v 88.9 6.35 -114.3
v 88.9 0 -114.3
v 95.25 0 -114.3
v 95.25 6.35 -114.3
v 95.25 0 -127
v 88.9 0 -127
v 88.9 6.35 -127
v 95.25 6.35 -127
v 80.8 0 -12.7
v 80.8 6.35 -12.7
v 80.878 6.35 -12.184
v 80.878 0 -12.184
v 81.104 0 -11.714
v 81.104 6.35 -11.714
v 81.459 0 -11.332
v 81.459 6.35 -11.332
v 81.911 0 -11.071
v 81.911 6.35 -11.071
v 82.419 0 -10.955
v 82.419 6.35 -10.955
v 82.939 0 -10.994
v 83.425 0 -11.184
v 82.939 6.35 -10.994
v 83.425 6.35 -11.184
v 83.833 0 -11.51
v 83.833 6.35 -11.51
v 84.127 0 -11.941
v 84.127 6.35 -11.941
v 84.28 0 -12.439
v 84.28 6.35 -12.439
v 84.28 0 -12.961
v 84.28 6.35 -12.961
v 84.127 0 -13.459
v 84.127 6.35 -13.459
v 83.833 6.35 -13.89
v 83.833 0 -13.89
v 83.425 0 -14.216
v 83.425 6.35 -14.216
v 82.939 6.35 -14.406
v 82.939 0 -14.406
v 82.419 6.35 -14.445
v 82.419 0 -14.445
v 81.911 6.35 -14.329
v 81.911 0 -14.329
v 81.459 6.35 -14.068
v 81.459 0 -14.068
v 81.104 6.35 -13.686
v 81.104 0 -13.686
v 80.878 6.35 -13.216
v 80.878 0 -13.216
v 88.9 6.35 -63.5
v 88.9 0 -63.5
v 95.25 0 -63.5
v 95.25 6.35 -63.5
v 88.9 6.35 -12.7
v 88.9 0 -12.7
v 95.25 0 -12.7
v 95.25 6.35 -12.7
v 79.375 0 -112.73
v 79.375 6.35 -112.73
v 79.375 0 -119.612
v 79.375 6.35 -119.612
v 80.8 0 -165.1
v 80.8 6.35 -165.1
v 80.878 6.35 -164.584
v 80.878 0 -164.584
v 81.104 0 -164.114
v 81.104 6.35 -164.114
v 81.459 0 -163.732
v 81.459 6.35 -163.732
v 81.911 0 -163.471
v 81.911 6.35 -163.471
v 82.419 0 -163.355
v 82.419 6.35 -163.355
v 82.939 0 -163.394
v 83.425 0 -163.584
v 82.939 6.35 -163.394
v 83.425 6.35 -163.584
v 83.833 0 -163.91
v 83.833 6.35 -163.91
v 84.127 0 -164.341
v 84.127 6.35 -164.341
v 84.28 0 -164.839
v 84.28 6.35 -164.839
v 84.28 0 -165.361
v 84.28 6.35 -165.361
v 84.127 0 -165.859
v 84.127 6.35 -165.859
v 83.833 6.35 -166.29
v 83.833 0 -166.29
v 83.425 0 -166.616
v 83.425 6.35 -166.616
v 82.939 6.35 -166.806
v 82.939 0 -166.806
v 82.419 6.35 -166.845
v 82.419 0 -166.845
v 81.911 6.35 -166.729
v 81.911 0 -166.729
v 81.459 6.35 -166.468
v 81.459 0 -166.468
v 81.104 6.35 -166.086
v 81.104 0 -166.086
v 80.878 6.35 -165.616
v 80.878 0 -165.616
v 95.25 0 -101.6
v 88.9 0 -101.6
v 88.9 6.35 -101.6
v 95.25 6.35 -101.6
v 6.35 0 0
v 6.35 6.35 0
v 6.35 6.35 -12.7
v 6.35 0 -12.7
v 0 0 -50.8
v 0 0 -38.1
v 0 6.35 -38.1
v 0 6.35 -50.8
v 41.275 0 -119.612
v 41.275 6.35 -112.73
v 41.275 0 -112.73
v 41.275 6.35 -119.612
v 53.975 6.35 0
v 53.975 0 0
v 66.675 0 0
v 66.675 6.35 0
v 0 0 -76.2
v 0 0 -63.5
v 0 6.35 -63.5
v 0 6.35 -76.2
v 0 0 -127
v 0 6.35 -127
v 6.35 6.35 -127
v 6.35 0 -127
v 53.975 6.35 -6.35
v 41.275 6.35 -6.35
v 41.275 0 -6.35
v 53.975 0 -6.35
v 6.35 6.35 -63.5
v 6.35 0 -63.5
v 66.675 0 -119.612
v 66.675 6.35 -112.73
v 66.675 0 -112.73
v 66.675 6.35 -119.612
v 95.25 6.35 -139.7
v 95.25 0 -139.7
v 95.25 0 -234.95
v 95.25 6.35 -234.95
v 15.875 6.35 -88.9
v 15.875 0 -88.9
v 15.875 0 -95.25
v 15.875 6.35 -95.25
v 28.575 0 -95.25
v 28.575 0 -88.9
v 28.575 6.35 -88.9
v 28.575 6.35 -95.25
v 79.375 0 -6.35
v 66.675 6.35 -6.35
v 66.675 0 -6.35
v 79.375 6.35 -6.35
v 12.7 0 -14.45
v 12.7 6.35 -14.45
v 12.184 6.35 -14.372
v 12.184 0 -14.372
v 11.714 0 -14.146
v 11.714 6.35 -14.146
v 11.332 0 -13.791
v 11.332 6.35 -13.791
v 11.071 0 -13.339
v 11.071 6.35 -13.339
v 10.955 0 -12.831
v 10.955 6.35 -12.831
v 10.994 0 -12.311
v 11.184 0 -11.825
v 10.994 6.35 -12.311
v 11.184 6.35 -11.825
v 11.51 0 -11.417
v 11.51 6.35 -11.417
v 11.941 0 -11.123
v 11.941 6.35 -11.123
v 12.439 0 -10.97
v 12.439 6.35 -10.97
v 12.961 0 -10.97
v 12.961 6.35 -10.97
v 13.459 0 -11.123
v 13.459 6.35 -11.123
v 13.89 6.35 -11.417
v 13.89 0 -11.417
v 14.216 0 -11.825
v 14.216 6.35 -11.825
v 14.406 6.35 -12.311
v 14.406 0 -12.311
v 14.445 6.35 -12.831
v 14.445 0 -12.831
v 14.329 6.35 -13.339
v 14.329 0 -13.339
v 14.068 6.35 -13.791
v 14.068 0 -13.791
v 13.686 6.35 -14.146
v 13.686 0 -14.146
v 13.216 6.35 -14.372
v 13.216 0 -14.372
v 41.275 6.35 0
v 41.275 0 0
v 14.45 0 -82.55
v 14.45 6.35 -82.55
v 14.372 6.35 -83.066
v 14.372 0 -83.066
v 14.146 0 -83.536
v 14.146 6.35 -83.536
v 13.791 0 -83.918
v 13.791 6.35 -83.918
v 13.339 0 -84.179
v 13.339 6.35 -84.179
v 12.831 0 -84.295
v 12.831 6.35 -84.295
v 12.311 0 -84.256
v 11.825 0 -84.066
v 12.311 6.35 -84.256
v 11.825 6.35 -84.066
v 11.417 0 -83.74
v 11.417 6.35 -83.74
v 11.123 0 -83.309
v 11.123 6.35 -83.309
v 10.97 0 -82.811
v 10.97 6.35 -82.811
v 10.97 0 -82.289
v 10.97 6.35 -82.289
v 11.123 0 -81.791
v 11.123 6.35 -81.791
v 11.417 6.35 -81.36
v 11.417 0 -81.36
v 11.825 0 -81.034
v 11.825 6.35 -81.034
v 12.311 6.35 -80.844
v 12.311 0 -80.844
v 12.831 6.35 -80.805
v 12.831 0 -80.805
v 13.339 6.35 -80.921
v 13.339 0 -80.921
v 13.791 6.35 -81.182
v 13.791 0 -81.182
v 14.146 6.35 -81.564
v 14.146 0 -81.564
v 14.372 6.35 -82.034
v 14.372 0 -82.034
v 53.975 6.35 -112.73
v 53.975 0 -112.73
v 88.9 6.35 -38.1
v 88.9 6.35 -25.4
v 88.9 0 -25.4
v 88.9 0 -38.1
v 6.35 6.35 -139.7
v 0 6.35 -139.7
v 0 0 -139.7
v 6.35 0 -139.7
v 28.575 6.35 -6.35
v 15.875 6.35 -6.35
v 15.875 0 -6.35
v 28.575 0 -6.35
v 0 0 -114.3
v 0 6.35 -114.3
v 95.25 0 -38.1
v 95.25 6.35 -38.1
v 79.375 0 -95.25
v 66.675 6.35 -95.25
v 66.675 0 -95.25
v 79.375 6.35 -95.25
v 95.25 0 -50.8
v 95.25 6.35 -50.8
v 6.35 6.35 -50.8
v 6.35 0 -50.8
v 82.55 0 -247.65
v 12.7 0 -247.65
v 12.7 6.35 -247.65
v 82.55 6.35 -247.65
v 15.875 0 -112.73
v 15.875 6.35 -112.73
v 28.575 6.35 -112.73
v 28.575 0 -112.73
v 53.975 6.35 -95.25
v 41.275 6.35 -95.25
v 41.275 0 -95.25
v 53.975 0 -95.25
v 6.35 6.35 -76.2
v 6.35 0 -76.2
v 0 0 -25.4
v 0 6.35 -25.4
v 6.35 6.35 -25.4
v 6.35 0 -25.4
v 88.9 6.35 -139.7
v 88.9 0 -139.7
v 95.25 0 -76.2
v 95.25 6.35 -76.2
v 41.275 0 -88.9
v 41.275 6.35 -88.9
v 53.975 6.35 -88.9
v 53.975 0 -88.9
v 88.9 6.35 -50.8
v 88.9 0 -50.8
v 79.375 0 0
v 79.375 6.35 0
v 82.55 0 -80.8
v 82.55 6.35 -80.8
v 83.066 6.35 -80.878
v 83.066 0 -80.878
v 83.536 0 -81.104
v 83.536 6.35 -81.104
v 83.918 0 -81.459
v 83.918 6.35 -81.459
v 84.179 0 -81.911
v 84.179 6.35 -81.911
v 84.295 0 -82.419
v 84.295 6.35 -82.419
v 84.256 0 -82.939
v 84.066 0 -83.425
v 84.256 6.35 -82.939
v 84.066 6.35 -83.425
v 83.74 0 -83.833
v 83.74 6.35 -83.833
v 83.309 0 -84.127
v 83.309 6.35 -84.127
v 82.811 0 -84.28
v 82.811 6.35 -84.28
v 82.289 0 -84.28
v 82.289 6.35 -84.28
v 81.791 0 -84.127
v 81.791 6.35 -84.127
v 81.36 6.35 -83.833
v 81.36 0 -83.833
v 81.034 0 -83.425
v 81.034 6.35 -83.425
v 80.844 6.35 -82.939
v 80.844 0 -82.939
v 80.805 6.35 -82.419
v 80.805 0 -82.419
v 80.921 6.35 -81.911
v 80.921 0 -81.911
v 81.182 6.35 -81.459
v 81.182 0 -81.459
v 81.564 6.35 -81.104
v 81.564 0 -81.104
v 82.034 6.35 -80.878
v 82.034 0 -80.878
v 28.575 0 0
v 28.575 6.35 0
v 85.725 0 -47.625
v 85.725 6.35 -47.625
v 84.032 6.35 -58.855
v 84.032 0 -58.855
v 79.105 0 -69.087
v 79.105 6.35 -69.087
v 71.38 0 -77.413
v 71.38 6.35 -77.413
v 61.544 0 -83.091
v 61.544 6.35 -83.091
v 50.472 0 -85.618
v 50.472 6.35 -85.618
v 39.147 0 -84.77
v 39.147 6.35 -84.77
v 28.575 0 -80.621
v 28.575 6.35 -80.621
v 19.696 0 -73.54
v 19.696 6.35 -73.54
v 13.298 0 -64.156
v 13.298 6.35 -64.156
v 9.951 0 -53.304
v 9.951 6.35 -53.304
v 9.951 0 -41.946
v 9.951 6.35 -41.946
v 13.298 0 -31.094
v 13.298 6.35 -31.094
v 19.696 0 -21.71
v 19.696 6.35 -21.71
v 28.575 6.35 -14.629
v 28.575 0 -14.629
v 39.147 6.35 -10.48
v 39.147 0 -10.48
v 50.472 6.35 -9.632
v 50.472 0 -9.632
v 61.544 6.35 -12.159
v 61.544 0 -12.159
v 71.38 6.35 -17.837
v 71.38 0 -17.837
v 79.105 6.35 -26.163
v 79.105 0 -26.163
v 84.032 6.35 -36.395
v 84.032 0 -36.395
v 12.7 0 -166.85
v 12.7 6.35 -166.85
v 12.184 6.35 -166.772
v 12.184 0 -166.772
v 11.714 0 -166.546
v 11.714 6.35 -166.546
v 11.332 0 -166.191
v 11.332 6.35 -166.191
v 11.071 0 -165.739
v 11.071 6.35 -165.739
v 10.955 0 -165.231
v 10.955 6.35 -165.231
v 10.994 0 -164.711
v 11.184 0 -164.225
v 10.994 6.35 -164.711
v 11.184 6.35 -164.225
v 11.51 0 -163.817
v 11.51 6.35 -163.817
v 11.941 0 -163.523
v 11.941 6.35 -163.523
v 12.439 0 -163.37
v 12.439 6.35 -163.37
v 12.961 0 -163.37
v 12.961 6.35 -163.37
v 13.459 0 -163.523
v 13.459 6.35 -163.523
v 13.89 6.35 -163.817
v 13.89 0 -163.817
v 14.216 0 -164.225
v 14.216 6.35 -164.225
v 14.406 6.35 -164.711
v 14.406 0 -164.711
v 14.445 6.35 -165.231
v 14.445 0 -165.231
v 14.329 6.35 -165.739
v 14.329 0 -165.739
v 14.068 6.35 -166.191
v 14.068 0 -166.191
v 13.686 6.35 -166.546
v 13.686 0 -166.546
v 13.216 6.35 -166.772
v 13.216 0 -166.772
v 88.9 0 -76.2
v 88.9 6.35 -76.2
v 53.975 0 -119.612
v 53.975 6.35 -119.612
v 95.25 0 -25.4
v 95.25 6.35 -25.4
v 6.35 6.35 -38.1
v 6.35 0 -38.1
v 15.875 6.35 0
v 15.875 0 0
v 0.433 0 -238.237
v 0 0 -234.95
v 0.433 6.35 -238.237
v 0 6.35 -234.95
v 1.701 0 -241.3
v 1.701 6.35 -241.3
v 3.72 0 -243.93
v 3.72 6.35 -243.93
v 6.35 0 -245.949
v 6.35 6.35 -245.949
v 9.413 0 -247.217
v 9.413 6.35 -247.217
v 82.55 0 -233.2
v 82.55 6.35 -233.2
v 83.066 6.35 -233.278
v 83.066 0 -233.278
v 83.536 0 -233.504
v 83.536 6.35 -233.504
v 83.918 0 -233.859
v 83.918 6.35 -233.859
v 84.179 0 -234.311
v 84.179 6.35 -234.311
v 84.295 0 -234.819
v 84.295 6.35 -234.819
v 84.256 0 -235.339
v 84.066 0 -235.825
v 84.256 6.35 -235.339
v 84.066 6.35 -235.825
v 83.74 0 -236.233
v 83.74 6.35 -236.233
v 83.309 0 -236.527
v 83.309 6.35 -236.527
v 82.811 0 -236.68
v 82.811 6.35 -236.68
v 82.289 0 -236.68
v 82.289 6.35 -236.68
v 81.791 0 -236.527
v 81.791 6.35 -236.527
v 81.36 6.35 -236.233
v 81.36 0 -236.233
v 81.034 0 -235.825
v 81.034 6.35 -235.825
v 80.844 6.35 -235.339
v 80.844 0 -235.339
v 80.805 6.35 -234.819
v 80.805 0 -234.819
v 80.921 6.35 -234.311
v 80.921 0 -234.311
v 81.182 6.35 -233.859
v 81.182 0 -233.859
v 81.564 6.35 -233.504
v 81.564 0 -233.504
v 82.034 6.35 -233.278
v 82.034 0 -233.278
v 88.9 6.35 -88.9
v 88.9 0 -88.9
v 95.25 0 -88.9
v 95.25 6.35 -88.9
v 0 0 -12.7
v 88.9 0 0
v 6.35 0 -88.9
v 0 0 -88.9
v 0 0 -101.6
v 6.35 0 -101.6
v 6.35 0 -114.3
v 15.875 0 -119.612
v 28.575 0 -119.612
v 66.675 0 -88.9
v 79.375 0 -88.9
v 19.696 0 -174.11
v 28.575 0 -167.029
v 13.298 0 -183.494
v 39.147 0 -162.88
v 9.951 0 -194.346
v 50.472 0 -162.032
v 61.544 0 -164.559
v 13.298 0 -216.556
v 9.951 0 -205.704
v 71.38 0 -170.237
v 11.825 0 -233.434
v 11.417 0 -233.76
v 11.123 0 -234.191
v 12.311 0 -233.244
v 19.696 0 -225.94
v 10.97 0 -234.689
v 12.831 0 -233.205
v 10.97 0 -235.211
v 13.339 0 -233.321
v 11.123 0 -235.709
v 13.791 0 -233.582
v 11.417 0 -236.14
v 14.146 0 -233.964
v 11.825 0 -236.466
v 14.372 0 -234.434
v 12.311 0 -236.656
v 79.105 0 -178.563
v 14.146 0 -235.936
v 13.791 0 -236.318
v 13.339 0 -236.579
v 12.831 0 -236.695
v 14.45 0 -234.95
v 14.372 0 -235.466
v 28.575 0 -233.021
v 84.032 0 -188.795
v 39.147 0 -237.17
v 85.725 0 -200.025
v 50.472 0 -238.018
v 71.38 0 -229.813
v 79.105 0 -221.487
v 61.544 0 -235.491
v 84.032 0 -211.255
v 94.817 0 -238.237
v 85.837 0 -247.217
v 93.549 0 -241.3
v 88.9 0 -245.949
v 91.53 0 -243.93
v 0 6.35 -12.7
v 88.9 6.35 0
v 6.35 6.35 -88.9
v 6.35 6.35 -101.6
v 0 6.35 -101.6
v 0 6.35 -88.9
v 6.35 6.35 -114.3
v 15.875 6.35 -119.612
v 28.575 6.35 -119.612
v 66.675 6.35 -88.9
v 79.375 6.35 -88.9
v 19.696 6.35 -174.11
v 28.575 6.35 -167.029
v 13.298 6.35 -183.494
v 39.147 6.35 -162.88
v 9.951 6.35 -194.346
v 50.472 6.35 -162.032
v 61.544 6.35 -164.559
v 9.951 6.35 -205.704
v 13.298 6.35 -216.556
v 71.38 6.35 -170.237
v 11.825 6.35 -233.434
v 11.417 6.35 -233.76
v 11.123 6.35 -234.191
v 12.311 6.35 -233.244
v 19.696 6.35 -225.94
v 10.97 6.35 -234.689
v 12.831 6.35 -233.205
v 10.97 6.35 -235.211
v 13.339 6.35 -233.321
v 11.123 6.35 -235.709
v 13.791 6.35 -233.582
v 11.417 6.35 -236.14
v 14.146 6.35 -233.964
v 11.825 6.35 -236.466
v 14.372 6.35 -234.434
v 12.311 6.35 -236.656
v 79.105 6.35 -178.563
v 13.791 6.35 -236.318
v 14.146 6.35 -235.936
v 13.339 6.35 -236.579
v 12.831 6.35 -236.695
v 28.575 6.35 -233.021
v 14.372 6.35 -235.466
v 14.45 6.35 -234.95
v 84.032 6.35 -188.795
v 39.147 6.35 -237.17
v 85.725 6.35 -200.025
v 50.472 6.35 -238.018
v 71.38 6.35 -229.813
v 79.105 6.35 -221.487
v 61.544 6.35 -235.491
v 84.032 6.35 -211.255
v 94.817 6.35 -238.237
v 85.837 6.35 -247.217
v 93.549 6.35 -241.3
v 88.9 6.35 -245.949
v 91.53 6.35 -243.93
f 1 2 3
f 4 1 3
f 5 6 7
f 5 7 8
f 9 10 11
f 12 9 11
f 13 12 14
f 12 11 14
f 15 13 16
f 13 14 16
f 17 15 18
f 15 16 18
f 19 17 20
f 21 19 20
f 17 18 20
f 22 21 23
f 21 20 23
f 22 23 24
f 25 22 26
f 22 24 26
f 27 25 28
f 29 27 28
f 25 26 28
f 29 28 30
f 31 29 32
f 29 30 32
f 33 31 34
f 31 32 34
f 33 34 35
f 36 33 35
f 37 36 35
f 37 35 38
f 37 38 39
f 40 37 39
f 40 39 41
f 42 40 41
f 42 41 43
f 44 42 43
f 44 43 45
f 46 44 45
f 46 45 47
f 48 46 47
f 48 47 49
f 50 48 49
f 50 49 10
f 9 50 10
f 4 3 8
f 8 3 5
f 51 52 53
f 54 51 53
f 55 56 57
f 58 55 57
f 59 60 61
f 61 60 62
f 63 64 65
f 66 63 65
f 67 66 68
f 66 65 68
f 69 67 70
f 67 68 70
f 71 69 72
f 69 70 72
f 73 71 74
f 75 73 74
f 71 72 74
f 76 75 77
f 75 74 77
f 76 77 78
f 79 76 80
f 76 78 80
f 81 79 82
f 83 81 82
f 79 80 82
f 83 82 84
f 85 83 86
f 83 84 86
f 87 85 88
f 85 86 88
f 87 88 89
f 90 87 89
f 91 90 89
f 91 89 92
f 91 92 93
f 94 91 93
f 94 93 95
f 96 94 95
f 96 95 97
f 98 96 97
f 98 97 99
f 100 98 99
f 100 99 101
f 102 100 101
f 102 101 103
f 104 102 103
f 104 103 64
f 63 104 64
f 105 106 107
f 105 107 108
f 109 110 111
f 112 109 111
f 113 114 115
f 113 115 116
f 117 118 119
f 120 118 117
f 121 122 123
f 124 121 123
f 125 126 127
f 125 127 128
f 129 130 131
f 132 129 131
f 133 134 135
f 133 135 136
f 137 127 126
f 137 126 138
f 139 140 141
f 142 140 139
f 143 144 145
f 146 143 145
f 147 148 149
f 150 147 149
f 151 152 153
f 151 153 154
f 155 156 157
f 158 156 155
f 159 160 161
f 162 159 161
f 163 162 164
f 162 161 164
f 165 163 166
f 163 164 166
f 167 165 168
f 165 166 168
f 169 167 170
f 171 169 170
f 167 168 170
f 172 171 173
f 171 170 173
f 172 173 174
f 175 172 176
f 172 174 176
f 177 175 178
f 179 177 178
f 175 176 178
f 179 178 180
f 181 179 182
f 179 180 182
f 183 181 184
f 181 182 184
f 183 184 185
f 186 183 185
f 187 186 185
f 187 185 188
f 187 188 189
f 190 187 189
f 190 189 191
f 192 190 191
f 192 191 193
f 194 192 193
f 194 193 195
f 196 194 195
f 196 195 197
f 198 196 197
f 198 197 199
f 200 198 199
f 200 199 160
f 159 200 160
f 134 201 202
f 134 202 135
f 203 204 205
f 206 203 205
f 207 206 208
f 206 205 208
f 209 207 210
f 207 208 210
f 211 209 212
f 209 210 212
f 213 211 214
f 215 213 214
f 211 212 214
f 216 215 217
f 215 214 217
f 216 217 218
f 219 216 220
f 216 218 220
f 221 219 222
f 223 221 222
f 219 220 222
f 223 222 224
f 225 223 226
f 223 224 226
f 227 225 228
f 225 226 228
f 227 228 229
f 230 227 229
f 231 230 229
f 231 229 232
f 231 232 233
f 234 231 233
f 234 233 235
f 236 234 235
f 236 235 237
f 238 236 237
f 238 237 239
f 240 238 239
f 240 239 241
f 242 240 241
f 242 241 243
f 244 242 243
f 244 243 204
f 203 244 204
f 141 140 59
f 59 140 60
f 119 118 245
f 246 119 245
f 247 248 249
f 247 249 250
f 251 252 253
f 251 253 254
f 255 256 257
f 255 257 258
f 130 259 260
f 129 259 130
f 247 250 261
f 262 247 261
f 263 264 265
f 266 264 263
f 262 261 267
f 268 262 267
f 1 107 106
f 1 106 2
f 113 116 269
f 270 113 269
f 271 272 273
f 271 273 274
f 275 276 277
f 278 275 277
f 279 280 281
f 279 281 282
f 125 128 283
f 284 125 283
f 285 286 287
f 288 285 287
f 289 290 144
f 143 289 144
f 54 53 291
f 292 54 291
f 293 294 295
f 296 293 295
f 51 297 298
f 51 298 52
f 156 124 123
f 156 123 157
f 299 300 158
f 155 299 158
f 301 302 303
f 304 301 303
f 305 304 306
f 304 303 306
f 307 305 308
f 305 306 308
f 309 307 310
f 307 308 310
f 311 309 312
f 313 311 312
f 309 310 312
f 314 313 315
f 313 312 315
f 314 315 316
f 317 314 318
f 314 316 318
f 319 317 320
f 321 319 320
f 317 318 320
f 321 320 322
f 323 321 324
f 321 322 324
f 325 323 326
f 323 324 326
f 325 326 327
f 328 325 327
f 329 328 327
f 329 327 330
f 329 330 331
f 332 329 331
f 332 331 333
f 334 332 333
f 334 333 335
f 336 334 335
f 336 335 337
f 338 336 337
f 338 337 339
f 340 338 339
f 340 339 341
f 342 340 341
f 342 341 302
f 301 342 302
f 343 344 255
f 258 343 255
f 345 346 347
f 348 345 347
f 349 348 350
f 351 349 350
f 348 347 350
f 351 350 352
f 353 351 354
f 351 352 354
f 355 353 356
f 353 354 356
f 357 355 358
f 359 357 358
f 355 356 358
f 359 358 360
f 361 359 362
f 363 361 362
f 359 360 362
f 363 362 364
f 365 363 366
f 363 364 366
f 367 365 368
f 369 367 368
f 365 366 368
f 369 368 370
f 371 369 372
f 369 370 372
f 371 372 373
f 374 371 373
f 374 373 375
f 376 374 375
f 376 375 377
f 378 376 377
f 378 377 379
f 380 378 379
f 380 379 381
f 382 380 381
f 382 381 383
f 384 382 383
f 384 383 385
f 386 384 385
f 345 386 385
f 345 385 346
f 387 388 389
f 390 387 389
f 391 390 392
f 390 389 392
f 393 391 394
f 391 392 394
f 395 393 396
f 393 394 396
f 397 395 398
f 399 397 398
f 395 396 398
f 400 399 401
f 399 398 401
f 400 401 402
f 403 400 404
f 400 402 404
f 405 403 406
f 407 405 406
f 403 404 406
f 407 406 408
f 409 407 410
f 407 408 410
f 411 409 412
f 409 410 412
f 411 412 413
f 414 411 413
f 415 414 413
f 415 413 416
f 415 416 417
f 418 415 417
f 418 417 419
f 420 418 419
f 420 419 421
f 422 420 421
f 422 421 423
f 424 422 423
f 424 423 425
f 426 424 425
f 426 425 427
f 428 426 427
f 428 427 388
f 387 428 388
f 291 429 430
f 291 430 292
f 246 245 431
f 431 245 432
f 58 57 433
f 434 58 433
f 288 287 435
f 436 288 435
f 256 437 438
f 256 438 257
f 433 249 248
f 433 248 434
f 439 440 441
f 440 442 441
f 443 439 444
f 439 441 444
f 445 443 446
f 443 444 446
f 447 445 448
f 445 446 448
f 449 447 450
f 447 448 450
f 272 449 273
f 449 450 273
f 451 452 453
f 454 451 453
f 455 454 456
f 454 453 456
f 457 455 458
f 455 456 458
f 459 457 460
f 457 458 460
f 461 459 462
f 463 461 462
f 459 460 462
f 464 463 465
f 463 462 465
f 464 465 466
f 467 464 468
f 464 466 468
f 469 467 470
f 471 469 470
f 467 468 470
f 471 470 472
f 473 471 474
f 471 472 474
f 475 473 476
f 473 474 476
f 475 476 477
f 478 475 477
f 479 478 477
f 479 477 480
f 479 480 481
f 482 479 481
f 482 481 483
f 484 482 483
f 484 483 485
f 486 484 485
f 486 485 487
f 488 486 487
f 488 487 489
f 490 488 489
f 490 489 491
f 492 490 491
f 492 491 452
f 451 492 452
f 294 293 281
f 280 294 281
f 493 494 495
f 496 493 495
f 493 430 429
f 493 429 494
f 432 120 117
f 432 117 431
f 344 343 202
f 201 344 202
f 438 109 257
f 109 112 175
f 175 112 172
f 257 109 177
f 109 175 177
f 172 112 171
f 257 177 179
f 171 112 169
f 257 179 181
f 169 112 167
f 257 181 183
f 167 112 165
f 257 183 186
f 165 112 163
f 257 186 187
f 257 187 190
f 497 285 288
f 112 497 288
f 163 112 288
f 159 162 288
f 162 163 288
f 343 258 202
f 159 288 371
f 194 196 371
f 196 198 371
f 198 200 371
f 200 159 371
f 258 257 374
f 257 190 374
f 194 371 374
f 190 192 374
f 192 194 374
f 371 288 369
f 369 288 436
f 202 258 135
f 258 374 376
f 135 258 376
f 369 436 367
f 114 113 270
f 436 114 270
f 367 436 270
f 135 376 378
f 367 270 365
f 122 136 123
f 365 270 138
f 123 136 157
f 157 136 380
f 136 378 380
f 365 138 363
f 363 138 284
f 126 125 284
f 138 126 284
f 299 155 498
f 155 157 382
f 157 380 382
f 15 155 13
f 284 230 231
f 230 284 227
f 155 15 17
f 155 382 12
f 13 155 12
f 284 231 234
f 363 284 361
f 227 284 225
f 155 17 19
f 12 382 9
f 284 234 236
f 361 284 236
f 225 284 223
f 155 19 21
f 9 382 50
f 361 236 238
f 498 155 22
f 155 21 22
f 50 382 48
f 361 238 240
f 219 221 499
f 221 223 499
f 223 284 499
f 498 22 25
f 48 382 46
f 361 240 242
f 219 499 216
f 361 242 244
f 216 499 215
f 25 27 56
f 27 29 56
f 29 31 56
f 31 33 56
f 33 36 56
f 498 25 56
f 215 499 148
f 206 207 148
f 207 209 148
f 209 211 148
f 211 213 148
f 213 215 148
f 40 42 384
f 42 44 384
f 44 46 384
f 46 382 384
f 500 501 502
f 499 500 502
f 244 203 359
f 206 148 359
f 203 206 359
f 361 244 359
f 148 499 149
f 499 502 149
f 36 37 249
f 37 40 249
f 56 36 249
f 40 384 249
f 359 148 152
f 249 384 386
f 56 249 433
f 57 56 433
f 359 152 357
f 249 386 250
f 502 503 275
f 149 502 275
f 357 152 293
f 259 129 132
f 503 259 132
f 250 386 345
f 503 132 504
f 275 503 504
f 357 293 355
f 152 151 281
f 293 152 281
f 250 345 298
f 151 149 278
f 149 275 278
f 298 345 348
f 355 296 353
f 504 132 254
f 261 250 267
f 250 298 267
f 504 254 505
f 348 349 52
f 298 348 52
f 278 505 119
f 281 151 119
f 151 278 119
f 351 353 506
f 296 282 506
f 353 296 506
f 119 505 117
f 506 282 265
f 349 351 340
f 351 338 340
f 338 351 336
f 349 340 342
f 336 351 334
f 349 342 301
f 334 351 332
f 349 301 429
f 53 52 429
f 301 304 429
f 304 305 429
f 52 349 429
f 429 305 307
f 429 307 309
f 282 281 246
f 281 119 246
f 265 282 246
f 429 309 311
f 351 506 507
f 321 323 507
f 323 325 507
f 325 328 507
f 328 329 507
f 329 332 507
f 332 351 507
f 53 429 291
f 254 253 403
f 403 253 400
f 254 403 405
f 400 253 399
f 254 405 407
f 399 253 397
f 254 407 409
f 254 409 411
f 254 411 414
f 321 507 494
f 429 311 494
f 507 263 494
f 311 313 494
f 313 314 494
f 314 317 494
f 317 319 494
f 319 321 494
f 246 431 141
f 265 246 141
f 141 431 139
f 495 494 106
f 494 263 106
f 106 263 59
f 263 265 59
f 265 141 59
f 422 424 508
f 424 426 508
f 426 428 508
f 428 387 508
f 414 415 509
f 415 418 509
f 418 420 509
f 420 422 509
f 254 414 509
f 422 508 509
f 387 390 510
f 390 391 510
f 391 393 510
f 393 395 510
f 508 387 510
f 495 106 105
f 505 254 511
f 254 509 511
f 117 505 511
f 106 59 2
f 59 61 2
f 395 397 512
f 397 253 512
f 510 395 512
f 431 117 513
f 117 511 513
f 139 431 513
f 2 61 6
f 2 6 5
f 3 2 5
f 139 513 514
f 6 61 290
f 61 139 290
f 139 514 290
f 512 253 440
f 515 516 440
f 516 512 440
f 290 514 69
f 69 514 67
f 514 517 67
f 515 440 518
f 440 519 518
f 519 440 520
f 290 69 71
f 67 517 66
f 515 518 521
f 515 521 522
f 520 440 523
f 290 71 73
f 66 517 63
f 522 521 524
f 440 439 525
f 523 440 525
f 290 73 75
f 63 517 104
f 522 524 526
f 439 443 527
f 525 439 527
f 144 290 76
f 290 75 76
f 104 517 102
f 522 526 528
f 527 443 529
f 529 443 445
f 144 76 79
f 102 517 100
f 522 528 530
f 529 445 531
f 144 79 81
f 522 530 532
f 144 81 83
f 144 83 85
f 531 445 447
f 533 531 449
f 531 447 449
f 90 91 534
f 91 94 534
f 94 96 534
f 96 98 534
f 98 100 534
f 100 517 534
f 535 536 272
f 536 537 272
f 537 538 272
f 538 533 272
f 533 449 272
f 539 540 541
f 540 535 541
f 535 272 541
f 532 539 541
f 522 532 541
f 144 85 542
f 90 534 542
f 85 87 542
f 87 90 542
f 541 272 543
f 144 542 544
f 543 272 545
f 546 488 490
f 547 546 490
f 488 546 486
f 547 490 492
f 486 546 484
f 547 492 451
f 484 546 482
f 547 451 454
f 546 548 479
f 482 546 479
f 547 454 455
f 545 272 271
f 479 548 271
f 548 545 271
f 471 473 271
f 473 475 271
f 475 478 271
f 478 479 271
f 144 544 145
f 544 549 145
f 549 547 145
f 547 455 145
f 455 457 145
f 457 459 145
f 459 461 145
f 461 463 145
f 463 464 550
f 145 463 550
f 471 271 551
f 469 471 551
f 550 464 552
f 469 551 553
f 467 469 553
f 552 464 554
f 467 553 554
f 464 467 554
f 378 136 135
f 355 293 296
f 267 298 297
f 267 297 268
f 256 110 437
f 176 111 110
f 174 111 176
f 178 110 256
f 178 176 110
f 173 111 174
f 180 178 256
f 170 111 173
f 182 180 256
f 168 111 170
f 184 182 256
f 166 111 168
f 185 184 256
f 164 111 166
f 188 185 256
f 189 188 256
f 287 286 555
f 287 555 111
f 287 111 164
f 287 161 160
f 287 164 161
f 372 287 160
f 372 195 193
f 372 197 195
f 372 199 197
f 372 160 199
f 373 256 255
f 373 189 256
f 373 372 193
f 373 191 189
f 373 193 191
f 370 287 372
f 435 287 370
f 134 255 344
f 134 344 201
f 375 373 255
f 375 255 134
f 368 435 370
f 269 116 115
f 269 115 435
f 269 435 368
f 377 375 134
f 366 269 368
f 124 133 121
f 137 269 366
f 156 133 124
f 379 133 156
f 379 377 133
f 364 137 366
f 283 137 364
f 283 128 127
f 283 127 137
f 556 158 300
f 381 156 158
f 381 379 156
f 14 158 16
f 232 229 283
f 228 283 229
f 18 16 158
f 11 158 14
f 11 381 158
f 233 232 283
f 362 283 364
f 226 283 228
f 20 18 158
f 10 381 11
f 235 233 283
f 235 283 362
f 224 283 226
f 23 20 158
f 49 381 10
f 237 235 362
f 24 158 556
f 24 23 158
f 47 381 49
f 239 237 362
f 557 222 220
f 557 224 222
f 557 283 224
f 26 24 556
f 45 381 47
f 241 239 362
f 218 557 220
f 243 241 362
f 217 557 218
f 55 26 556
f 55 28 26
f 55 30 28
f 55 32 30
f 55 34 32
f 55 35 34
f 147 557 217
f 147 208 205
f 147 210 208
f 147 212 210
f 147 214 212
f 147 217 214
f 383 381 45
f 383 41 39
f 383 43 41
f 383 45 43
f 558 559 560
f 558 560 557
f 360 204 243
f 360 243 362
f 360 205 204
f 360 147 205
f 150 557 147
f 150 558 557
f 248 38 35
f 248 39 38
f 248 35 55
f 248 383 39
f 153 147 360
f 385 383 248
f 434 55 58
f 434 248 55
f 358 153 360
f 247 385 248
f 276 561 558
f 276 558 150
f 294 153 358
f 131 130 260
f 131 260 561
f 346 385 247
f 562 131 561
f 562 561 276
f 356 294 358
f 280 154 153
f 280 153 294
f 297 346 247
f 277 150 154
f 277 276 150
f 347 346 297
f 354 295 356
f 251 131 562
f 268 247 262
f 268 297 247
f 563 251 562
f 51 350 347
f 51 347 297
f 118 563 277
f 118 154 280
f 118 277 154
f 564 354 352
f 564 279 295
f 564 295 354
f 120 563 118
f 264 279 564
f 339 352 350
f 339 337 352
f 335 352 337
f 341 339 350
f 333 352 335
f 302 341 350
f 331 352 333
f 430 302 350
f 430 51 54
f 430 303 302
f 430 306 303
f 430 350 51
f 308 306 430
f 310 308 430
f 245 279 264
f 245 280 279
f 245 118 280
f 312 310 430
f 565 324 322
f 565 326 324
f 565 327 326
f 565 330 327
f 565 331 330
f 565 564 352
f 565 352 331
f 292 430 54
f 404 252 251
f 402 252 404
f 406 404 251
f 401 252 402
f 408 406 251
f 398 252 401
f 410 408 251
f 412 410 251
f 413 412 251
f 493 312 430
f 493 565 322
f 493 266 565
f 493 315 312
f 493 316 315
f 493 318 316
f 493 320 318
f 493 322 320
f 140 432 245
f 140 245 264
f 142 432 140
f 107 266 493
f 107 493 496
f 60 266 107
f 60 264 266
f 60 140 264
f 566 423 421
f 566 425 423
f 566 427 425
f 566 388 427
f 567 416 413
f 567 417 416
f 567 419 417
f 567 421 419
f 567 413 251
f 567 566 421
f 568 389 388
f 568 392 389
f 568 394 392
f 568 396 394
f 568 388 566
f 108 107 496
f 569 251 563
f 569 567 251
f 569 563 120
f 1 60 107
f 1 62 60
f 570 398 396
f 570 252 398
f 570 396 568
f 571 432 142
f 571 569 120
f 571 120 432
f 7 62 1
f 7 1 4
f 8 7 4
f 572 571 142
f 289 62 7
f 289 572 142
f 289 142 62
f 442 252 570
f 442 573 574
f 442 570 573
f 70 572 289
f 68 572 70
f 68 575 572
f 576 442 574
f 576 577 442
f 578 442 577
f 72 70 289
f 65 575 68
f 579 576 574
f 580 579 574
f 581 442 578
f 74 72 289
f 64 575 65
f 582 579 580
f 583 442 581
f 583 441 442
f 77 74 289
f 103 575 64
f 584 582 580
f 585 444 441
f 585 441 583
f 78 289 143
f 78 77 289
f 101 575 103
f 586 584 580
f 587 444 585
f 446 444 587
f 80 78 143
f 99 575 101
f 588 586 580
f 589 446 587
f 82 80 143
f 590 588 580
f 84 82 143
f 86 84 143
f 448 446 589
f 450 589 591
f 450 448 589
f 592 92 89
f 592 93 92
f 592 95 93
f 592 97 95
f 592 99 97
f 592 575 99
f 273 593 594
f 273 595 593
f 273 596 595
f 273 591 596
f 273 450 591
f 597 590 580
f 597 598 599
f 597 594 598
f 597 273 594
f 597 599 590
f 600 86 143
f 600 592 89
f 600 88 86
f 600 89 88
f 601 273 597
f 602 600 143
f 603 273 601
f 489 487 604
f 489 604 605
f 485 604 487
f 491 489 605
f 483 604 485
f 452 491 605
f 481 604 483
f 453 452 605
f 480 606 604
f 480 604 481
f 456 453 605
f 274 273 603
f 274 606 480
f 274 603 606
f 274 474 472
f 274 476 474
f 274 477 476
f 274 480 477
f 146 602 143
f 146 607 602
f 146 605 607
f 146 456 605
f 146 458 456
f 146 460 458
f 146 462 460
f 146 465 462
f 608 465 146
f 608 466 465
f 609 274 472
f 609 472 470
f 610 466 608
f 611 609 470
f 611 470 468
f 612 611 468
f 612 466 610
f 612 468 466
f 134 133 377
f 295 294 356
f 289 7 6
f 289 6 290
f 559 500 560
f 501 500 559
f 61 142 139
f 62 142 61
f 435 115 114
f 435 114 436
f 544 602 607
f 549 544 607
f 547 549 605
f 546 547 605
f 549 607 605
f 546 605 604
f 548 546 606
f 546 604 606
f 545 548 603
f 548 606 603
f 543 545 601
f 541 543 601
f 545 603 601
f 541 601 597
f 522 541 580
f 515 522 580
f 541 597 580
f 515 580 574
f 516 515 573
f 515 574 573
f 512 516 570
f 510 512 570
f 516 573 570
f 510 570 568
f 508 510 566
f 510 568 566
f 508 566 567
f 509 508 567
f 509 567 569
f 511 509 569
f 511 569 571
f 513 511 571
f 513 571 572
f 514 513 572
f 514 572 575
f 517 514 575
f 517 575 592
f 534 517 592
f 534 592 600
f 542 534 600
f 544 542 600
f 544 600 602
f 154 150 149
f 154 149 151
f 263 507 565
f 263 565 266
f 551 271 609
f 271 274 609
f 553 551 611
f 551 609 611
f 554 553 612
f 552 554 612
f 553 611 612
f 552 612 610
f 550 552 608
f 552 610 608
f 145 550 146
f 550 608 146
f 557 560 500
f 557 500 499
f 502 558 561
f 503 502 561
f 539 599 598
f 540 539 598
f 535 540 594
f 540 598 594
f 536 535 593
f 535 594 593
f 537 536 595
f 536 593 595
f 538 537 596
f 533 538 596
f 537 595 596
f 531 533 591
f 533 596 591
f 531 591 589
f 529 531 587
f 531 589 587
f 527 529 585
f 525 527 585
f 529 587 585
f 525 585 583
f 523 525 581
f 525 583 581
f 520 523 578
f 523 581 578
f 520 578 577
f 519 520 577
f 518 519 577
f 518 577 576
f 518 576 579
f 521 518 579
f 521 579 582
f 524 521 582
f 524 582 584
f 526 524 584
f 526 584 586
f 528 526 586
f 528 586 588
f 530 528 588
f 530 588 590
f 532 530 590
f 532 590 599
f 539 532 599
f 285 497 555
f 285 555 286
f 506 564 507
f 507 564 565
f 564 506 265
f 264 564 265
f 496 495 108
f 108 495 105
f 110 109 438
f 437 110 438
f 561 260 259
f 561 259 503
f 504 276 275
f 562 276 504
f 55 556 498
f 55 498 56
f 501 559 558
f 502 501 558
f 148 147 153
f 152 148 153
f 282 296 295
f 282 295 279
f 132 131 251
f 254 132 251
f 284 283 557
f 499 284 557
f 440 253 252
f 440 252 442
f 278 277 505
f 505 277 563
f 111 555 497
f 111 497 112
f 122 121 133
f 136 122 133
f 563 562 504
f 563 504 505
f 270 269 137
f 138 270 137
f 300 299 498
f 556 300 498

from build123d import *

# Parameters (mm, degrees)
SKETCH1_W           = 95.25
SKETCH1_H           = 247.65
BOSS_EXTRUDE1_DEPTH = 6.35
SKETCH2_R           = 38.1
CUT_EXTRUDE1_DEPTH  = 7.35
SKETCH3_W           = 6.35
SKETCH3_H           = 12.7
CUT_EXTRUDE2_DEPTH  = 7.35
LPATTERN1_COUNT     = 6
LPATTERN1_PITCH     = 25.4
SKETCH4_W           = 12.7
SKETCH4_H           = 6.35
CUT_EXTRUDE3_DEPTH  = 7.35
SKETCH5_W           = 12.7
SKETCH5_H           = 6.35
CUT_EXTRUDE4_DEPTH  = 7.35
SKETCH8_W           = 12.7
SKETCH8_H           = 6.881389346
CUT_EXTRUDE5_DEPTH  = 7.35
SKETCH9_R           = 1.75
CUT_EXTRUDE6_DEPTH  = 7.35
CIRPATTERN1_COUNT   = 4
FILLET1_R           = 12.7
SKETCH10_R          = 1.75
CUT_EXTRUDE7_DEPTH  = 7.35
CIRPATTERN2_COUNT   = 4


with BuildPart() as part:
    # Sketch1 → Boss-Extrude1 (new body)
    with BuildSketch(Plane(origin=(0, 0, 0), x_dir=(1, 0, 0), z_dir=(0, 1, 0))):
        with Locations((47.625, 123.825)):
            Rectangle(SKETCH1_W, SKETCH1_H)
    extrude(amount=BOSS_EXTRUDE1_DEPTH)

    # Sketch2 → Cut-Extrude1 (cut, through all)
    with BuildSketch(Plane(origin=(0, 6.35, 0), x_dir=(1, 0, 0), z_dir=(0, 1, 0))):
        with Locations((47.625, 200.025)):
            Circle(SKETCH2_R)
        with Locations((47.625, 47.625)):
            Circle(SKETCH2_R)
    extrude(amount=-CUT_EXTRUDE1_DEPTH, mode=Mode.SUBTRACT)

    # Sketch3 → Cut-Extrude2 (cut, through all)
    with BuildSketch(Plane(origin=(0, 6.35, 0), x_dir=(1, 0, 0), z_dir=(0, 1, 0))):
        with Locations((3.175, 6.35)):
            Rectangle(SKETCH3_W, SKETCH3_H)
        with Locations((92.075, 6.35)):
            Rectangle(SKETCH3_W, SKETCH3_H)
    cut_extrude2 = extrude(amount=-CUT_EXTRUDE2_DEPTH, mode=Mode.SUBTRACT)

    # LPattern1: Cut-Extrude2 ×6
    with Locations(*[(0, 0, -i * LPATTERN1_PITCH) for i in range(1, LPATTERN1_COUNT)]):
        add(cut_extrude2, mode=Mode.SUBTRACT)

    # Sketch4 → Cut-Extrude3 (cut, through all)
    with BuildSketch(Plane(origin=(0, 6.35, 0), x_dir=(1, 0, 0), z_dir=(0, 1, 0))):
        with Locations((47.625, 3.175)):
            Rectangle(SKETCH4_W, SKETCH4_H)
        with Locations((22.225, 3.175)):
            Rectangle(SKETCH4_W, SKETCH4_H)
        with Locations((73.025, 3.175)):
            Rectangle(SKETCH4_W, SKETCH4_H)
    extrude(amount=-CUT_EXTRUDE3_DEPTH, mode=Mode.SUBTRACT)

    # Sketch5 → Cut-Extrude4 (cut, through all)
    with BuildSketch(Plane(origin=(0, 6.35, 0), x_dir=(1, 0, 0), z_dir=(0, 1, 0))):
        with Locations((22.225, 92.075)):
            Rectangle(SKETCH5_W, SKETCH5_H)
        with Locations((47.625, 92.075)):
            Rectangle(SKETCH5_W, SKETCH5_H)
        with Locations((73.025, 92.075)):
            Rectangle(SKETCH5_W, SKETCH5_H)
    extrude(amount=-CUT_EXTRUDE4_DEPTH, mode=Mode.SUBTRACT)

    # Sketch8 → Cut-Extrude5 (cut, through all)
    with BuildSketch(Plane(origin=(0, 6.35, 0), x_dir=(1, 0, 0), z_dir=(0, 1, 0))):
        with Locations((22.225, 116.170967205)):
            Rectangle(SKETCH8_W, SKETCH8_H)
        with Locations((47.625, 116.170967205)):
            Rectangle(SKETCH8_W, SKETCH8_H)
        with Locations((73.025, 116.170967205)):
            Rectangle(SKETCH8_W, SKETCH8_H)
    extrude(amount=-CUT_EXTRUDE5_DEPTH, mode=Mode.SUBTRACT)

    # Sketch9 → Cut-Extrude6 (cut, through all)
    with BuildSketch(Plane(origin=(0, 6.35, 0), x_dir=(1, 0, 0), z_dir=(0, 1, 0))):
        with Locations((12.7, 82.55)):
            Circle(SKETCH9_R)
    cut_extrude6 = extrude(amount=-CUT_EXTRUDE6_DEPTH, mode=Mode.SUBTRACT)

    # CirPattern1: Cut-Extrude6 ×4 about axis
    cirpattern1_axis = Axis((47.625, 0, -47.625), (0, 1, 0))
    for i in range(1, CIRPATTERN1_COUNT):
        add(cut_extrude6.rotate(cirpattern1_axis, i * 360 / CIRPATTERN1_COUNT), mode=Mode.SUBTRACT)

    # Fillet1
    fillet1_edges = [part.edges().sort_by_distance(p)[0] for p in [
        (0, 3.175, -247.65),
        (95.25, 3.175, -247.65),
    ]]
    fillet(fillet1_edges, radius=FILLET1_R)

    # Sketch10 → Cut-Extrude7 (cut, through all)
    with BuildSketch(Plane(origin=(0, 6.35, 0), x_dir=(1, 0, 0), z_dir=(0, 1, 0))):
        with Locations((12.7, 234.95)):
            Circle(SKETCH10_R)
    cut_extrude7 = extrude(amount=-CUT_EXTRUDE7_DEPTH, mode=Mode.SUBTRACT)

    # CirPattern2: Cut-Extrude7 ×4 about axis
    cirpattern2_axis = Axis((47.625, 0, -200.025), (0, 1, 0))
    for i in range(1, CIRPATTERN2_COUNT):
        add(cut_extrude7.rotate(cirpattern2_axis, i * 360 / CIRPATTERN2_COUNT), mode=Mode.SUBTRACT)


solid = part.part
